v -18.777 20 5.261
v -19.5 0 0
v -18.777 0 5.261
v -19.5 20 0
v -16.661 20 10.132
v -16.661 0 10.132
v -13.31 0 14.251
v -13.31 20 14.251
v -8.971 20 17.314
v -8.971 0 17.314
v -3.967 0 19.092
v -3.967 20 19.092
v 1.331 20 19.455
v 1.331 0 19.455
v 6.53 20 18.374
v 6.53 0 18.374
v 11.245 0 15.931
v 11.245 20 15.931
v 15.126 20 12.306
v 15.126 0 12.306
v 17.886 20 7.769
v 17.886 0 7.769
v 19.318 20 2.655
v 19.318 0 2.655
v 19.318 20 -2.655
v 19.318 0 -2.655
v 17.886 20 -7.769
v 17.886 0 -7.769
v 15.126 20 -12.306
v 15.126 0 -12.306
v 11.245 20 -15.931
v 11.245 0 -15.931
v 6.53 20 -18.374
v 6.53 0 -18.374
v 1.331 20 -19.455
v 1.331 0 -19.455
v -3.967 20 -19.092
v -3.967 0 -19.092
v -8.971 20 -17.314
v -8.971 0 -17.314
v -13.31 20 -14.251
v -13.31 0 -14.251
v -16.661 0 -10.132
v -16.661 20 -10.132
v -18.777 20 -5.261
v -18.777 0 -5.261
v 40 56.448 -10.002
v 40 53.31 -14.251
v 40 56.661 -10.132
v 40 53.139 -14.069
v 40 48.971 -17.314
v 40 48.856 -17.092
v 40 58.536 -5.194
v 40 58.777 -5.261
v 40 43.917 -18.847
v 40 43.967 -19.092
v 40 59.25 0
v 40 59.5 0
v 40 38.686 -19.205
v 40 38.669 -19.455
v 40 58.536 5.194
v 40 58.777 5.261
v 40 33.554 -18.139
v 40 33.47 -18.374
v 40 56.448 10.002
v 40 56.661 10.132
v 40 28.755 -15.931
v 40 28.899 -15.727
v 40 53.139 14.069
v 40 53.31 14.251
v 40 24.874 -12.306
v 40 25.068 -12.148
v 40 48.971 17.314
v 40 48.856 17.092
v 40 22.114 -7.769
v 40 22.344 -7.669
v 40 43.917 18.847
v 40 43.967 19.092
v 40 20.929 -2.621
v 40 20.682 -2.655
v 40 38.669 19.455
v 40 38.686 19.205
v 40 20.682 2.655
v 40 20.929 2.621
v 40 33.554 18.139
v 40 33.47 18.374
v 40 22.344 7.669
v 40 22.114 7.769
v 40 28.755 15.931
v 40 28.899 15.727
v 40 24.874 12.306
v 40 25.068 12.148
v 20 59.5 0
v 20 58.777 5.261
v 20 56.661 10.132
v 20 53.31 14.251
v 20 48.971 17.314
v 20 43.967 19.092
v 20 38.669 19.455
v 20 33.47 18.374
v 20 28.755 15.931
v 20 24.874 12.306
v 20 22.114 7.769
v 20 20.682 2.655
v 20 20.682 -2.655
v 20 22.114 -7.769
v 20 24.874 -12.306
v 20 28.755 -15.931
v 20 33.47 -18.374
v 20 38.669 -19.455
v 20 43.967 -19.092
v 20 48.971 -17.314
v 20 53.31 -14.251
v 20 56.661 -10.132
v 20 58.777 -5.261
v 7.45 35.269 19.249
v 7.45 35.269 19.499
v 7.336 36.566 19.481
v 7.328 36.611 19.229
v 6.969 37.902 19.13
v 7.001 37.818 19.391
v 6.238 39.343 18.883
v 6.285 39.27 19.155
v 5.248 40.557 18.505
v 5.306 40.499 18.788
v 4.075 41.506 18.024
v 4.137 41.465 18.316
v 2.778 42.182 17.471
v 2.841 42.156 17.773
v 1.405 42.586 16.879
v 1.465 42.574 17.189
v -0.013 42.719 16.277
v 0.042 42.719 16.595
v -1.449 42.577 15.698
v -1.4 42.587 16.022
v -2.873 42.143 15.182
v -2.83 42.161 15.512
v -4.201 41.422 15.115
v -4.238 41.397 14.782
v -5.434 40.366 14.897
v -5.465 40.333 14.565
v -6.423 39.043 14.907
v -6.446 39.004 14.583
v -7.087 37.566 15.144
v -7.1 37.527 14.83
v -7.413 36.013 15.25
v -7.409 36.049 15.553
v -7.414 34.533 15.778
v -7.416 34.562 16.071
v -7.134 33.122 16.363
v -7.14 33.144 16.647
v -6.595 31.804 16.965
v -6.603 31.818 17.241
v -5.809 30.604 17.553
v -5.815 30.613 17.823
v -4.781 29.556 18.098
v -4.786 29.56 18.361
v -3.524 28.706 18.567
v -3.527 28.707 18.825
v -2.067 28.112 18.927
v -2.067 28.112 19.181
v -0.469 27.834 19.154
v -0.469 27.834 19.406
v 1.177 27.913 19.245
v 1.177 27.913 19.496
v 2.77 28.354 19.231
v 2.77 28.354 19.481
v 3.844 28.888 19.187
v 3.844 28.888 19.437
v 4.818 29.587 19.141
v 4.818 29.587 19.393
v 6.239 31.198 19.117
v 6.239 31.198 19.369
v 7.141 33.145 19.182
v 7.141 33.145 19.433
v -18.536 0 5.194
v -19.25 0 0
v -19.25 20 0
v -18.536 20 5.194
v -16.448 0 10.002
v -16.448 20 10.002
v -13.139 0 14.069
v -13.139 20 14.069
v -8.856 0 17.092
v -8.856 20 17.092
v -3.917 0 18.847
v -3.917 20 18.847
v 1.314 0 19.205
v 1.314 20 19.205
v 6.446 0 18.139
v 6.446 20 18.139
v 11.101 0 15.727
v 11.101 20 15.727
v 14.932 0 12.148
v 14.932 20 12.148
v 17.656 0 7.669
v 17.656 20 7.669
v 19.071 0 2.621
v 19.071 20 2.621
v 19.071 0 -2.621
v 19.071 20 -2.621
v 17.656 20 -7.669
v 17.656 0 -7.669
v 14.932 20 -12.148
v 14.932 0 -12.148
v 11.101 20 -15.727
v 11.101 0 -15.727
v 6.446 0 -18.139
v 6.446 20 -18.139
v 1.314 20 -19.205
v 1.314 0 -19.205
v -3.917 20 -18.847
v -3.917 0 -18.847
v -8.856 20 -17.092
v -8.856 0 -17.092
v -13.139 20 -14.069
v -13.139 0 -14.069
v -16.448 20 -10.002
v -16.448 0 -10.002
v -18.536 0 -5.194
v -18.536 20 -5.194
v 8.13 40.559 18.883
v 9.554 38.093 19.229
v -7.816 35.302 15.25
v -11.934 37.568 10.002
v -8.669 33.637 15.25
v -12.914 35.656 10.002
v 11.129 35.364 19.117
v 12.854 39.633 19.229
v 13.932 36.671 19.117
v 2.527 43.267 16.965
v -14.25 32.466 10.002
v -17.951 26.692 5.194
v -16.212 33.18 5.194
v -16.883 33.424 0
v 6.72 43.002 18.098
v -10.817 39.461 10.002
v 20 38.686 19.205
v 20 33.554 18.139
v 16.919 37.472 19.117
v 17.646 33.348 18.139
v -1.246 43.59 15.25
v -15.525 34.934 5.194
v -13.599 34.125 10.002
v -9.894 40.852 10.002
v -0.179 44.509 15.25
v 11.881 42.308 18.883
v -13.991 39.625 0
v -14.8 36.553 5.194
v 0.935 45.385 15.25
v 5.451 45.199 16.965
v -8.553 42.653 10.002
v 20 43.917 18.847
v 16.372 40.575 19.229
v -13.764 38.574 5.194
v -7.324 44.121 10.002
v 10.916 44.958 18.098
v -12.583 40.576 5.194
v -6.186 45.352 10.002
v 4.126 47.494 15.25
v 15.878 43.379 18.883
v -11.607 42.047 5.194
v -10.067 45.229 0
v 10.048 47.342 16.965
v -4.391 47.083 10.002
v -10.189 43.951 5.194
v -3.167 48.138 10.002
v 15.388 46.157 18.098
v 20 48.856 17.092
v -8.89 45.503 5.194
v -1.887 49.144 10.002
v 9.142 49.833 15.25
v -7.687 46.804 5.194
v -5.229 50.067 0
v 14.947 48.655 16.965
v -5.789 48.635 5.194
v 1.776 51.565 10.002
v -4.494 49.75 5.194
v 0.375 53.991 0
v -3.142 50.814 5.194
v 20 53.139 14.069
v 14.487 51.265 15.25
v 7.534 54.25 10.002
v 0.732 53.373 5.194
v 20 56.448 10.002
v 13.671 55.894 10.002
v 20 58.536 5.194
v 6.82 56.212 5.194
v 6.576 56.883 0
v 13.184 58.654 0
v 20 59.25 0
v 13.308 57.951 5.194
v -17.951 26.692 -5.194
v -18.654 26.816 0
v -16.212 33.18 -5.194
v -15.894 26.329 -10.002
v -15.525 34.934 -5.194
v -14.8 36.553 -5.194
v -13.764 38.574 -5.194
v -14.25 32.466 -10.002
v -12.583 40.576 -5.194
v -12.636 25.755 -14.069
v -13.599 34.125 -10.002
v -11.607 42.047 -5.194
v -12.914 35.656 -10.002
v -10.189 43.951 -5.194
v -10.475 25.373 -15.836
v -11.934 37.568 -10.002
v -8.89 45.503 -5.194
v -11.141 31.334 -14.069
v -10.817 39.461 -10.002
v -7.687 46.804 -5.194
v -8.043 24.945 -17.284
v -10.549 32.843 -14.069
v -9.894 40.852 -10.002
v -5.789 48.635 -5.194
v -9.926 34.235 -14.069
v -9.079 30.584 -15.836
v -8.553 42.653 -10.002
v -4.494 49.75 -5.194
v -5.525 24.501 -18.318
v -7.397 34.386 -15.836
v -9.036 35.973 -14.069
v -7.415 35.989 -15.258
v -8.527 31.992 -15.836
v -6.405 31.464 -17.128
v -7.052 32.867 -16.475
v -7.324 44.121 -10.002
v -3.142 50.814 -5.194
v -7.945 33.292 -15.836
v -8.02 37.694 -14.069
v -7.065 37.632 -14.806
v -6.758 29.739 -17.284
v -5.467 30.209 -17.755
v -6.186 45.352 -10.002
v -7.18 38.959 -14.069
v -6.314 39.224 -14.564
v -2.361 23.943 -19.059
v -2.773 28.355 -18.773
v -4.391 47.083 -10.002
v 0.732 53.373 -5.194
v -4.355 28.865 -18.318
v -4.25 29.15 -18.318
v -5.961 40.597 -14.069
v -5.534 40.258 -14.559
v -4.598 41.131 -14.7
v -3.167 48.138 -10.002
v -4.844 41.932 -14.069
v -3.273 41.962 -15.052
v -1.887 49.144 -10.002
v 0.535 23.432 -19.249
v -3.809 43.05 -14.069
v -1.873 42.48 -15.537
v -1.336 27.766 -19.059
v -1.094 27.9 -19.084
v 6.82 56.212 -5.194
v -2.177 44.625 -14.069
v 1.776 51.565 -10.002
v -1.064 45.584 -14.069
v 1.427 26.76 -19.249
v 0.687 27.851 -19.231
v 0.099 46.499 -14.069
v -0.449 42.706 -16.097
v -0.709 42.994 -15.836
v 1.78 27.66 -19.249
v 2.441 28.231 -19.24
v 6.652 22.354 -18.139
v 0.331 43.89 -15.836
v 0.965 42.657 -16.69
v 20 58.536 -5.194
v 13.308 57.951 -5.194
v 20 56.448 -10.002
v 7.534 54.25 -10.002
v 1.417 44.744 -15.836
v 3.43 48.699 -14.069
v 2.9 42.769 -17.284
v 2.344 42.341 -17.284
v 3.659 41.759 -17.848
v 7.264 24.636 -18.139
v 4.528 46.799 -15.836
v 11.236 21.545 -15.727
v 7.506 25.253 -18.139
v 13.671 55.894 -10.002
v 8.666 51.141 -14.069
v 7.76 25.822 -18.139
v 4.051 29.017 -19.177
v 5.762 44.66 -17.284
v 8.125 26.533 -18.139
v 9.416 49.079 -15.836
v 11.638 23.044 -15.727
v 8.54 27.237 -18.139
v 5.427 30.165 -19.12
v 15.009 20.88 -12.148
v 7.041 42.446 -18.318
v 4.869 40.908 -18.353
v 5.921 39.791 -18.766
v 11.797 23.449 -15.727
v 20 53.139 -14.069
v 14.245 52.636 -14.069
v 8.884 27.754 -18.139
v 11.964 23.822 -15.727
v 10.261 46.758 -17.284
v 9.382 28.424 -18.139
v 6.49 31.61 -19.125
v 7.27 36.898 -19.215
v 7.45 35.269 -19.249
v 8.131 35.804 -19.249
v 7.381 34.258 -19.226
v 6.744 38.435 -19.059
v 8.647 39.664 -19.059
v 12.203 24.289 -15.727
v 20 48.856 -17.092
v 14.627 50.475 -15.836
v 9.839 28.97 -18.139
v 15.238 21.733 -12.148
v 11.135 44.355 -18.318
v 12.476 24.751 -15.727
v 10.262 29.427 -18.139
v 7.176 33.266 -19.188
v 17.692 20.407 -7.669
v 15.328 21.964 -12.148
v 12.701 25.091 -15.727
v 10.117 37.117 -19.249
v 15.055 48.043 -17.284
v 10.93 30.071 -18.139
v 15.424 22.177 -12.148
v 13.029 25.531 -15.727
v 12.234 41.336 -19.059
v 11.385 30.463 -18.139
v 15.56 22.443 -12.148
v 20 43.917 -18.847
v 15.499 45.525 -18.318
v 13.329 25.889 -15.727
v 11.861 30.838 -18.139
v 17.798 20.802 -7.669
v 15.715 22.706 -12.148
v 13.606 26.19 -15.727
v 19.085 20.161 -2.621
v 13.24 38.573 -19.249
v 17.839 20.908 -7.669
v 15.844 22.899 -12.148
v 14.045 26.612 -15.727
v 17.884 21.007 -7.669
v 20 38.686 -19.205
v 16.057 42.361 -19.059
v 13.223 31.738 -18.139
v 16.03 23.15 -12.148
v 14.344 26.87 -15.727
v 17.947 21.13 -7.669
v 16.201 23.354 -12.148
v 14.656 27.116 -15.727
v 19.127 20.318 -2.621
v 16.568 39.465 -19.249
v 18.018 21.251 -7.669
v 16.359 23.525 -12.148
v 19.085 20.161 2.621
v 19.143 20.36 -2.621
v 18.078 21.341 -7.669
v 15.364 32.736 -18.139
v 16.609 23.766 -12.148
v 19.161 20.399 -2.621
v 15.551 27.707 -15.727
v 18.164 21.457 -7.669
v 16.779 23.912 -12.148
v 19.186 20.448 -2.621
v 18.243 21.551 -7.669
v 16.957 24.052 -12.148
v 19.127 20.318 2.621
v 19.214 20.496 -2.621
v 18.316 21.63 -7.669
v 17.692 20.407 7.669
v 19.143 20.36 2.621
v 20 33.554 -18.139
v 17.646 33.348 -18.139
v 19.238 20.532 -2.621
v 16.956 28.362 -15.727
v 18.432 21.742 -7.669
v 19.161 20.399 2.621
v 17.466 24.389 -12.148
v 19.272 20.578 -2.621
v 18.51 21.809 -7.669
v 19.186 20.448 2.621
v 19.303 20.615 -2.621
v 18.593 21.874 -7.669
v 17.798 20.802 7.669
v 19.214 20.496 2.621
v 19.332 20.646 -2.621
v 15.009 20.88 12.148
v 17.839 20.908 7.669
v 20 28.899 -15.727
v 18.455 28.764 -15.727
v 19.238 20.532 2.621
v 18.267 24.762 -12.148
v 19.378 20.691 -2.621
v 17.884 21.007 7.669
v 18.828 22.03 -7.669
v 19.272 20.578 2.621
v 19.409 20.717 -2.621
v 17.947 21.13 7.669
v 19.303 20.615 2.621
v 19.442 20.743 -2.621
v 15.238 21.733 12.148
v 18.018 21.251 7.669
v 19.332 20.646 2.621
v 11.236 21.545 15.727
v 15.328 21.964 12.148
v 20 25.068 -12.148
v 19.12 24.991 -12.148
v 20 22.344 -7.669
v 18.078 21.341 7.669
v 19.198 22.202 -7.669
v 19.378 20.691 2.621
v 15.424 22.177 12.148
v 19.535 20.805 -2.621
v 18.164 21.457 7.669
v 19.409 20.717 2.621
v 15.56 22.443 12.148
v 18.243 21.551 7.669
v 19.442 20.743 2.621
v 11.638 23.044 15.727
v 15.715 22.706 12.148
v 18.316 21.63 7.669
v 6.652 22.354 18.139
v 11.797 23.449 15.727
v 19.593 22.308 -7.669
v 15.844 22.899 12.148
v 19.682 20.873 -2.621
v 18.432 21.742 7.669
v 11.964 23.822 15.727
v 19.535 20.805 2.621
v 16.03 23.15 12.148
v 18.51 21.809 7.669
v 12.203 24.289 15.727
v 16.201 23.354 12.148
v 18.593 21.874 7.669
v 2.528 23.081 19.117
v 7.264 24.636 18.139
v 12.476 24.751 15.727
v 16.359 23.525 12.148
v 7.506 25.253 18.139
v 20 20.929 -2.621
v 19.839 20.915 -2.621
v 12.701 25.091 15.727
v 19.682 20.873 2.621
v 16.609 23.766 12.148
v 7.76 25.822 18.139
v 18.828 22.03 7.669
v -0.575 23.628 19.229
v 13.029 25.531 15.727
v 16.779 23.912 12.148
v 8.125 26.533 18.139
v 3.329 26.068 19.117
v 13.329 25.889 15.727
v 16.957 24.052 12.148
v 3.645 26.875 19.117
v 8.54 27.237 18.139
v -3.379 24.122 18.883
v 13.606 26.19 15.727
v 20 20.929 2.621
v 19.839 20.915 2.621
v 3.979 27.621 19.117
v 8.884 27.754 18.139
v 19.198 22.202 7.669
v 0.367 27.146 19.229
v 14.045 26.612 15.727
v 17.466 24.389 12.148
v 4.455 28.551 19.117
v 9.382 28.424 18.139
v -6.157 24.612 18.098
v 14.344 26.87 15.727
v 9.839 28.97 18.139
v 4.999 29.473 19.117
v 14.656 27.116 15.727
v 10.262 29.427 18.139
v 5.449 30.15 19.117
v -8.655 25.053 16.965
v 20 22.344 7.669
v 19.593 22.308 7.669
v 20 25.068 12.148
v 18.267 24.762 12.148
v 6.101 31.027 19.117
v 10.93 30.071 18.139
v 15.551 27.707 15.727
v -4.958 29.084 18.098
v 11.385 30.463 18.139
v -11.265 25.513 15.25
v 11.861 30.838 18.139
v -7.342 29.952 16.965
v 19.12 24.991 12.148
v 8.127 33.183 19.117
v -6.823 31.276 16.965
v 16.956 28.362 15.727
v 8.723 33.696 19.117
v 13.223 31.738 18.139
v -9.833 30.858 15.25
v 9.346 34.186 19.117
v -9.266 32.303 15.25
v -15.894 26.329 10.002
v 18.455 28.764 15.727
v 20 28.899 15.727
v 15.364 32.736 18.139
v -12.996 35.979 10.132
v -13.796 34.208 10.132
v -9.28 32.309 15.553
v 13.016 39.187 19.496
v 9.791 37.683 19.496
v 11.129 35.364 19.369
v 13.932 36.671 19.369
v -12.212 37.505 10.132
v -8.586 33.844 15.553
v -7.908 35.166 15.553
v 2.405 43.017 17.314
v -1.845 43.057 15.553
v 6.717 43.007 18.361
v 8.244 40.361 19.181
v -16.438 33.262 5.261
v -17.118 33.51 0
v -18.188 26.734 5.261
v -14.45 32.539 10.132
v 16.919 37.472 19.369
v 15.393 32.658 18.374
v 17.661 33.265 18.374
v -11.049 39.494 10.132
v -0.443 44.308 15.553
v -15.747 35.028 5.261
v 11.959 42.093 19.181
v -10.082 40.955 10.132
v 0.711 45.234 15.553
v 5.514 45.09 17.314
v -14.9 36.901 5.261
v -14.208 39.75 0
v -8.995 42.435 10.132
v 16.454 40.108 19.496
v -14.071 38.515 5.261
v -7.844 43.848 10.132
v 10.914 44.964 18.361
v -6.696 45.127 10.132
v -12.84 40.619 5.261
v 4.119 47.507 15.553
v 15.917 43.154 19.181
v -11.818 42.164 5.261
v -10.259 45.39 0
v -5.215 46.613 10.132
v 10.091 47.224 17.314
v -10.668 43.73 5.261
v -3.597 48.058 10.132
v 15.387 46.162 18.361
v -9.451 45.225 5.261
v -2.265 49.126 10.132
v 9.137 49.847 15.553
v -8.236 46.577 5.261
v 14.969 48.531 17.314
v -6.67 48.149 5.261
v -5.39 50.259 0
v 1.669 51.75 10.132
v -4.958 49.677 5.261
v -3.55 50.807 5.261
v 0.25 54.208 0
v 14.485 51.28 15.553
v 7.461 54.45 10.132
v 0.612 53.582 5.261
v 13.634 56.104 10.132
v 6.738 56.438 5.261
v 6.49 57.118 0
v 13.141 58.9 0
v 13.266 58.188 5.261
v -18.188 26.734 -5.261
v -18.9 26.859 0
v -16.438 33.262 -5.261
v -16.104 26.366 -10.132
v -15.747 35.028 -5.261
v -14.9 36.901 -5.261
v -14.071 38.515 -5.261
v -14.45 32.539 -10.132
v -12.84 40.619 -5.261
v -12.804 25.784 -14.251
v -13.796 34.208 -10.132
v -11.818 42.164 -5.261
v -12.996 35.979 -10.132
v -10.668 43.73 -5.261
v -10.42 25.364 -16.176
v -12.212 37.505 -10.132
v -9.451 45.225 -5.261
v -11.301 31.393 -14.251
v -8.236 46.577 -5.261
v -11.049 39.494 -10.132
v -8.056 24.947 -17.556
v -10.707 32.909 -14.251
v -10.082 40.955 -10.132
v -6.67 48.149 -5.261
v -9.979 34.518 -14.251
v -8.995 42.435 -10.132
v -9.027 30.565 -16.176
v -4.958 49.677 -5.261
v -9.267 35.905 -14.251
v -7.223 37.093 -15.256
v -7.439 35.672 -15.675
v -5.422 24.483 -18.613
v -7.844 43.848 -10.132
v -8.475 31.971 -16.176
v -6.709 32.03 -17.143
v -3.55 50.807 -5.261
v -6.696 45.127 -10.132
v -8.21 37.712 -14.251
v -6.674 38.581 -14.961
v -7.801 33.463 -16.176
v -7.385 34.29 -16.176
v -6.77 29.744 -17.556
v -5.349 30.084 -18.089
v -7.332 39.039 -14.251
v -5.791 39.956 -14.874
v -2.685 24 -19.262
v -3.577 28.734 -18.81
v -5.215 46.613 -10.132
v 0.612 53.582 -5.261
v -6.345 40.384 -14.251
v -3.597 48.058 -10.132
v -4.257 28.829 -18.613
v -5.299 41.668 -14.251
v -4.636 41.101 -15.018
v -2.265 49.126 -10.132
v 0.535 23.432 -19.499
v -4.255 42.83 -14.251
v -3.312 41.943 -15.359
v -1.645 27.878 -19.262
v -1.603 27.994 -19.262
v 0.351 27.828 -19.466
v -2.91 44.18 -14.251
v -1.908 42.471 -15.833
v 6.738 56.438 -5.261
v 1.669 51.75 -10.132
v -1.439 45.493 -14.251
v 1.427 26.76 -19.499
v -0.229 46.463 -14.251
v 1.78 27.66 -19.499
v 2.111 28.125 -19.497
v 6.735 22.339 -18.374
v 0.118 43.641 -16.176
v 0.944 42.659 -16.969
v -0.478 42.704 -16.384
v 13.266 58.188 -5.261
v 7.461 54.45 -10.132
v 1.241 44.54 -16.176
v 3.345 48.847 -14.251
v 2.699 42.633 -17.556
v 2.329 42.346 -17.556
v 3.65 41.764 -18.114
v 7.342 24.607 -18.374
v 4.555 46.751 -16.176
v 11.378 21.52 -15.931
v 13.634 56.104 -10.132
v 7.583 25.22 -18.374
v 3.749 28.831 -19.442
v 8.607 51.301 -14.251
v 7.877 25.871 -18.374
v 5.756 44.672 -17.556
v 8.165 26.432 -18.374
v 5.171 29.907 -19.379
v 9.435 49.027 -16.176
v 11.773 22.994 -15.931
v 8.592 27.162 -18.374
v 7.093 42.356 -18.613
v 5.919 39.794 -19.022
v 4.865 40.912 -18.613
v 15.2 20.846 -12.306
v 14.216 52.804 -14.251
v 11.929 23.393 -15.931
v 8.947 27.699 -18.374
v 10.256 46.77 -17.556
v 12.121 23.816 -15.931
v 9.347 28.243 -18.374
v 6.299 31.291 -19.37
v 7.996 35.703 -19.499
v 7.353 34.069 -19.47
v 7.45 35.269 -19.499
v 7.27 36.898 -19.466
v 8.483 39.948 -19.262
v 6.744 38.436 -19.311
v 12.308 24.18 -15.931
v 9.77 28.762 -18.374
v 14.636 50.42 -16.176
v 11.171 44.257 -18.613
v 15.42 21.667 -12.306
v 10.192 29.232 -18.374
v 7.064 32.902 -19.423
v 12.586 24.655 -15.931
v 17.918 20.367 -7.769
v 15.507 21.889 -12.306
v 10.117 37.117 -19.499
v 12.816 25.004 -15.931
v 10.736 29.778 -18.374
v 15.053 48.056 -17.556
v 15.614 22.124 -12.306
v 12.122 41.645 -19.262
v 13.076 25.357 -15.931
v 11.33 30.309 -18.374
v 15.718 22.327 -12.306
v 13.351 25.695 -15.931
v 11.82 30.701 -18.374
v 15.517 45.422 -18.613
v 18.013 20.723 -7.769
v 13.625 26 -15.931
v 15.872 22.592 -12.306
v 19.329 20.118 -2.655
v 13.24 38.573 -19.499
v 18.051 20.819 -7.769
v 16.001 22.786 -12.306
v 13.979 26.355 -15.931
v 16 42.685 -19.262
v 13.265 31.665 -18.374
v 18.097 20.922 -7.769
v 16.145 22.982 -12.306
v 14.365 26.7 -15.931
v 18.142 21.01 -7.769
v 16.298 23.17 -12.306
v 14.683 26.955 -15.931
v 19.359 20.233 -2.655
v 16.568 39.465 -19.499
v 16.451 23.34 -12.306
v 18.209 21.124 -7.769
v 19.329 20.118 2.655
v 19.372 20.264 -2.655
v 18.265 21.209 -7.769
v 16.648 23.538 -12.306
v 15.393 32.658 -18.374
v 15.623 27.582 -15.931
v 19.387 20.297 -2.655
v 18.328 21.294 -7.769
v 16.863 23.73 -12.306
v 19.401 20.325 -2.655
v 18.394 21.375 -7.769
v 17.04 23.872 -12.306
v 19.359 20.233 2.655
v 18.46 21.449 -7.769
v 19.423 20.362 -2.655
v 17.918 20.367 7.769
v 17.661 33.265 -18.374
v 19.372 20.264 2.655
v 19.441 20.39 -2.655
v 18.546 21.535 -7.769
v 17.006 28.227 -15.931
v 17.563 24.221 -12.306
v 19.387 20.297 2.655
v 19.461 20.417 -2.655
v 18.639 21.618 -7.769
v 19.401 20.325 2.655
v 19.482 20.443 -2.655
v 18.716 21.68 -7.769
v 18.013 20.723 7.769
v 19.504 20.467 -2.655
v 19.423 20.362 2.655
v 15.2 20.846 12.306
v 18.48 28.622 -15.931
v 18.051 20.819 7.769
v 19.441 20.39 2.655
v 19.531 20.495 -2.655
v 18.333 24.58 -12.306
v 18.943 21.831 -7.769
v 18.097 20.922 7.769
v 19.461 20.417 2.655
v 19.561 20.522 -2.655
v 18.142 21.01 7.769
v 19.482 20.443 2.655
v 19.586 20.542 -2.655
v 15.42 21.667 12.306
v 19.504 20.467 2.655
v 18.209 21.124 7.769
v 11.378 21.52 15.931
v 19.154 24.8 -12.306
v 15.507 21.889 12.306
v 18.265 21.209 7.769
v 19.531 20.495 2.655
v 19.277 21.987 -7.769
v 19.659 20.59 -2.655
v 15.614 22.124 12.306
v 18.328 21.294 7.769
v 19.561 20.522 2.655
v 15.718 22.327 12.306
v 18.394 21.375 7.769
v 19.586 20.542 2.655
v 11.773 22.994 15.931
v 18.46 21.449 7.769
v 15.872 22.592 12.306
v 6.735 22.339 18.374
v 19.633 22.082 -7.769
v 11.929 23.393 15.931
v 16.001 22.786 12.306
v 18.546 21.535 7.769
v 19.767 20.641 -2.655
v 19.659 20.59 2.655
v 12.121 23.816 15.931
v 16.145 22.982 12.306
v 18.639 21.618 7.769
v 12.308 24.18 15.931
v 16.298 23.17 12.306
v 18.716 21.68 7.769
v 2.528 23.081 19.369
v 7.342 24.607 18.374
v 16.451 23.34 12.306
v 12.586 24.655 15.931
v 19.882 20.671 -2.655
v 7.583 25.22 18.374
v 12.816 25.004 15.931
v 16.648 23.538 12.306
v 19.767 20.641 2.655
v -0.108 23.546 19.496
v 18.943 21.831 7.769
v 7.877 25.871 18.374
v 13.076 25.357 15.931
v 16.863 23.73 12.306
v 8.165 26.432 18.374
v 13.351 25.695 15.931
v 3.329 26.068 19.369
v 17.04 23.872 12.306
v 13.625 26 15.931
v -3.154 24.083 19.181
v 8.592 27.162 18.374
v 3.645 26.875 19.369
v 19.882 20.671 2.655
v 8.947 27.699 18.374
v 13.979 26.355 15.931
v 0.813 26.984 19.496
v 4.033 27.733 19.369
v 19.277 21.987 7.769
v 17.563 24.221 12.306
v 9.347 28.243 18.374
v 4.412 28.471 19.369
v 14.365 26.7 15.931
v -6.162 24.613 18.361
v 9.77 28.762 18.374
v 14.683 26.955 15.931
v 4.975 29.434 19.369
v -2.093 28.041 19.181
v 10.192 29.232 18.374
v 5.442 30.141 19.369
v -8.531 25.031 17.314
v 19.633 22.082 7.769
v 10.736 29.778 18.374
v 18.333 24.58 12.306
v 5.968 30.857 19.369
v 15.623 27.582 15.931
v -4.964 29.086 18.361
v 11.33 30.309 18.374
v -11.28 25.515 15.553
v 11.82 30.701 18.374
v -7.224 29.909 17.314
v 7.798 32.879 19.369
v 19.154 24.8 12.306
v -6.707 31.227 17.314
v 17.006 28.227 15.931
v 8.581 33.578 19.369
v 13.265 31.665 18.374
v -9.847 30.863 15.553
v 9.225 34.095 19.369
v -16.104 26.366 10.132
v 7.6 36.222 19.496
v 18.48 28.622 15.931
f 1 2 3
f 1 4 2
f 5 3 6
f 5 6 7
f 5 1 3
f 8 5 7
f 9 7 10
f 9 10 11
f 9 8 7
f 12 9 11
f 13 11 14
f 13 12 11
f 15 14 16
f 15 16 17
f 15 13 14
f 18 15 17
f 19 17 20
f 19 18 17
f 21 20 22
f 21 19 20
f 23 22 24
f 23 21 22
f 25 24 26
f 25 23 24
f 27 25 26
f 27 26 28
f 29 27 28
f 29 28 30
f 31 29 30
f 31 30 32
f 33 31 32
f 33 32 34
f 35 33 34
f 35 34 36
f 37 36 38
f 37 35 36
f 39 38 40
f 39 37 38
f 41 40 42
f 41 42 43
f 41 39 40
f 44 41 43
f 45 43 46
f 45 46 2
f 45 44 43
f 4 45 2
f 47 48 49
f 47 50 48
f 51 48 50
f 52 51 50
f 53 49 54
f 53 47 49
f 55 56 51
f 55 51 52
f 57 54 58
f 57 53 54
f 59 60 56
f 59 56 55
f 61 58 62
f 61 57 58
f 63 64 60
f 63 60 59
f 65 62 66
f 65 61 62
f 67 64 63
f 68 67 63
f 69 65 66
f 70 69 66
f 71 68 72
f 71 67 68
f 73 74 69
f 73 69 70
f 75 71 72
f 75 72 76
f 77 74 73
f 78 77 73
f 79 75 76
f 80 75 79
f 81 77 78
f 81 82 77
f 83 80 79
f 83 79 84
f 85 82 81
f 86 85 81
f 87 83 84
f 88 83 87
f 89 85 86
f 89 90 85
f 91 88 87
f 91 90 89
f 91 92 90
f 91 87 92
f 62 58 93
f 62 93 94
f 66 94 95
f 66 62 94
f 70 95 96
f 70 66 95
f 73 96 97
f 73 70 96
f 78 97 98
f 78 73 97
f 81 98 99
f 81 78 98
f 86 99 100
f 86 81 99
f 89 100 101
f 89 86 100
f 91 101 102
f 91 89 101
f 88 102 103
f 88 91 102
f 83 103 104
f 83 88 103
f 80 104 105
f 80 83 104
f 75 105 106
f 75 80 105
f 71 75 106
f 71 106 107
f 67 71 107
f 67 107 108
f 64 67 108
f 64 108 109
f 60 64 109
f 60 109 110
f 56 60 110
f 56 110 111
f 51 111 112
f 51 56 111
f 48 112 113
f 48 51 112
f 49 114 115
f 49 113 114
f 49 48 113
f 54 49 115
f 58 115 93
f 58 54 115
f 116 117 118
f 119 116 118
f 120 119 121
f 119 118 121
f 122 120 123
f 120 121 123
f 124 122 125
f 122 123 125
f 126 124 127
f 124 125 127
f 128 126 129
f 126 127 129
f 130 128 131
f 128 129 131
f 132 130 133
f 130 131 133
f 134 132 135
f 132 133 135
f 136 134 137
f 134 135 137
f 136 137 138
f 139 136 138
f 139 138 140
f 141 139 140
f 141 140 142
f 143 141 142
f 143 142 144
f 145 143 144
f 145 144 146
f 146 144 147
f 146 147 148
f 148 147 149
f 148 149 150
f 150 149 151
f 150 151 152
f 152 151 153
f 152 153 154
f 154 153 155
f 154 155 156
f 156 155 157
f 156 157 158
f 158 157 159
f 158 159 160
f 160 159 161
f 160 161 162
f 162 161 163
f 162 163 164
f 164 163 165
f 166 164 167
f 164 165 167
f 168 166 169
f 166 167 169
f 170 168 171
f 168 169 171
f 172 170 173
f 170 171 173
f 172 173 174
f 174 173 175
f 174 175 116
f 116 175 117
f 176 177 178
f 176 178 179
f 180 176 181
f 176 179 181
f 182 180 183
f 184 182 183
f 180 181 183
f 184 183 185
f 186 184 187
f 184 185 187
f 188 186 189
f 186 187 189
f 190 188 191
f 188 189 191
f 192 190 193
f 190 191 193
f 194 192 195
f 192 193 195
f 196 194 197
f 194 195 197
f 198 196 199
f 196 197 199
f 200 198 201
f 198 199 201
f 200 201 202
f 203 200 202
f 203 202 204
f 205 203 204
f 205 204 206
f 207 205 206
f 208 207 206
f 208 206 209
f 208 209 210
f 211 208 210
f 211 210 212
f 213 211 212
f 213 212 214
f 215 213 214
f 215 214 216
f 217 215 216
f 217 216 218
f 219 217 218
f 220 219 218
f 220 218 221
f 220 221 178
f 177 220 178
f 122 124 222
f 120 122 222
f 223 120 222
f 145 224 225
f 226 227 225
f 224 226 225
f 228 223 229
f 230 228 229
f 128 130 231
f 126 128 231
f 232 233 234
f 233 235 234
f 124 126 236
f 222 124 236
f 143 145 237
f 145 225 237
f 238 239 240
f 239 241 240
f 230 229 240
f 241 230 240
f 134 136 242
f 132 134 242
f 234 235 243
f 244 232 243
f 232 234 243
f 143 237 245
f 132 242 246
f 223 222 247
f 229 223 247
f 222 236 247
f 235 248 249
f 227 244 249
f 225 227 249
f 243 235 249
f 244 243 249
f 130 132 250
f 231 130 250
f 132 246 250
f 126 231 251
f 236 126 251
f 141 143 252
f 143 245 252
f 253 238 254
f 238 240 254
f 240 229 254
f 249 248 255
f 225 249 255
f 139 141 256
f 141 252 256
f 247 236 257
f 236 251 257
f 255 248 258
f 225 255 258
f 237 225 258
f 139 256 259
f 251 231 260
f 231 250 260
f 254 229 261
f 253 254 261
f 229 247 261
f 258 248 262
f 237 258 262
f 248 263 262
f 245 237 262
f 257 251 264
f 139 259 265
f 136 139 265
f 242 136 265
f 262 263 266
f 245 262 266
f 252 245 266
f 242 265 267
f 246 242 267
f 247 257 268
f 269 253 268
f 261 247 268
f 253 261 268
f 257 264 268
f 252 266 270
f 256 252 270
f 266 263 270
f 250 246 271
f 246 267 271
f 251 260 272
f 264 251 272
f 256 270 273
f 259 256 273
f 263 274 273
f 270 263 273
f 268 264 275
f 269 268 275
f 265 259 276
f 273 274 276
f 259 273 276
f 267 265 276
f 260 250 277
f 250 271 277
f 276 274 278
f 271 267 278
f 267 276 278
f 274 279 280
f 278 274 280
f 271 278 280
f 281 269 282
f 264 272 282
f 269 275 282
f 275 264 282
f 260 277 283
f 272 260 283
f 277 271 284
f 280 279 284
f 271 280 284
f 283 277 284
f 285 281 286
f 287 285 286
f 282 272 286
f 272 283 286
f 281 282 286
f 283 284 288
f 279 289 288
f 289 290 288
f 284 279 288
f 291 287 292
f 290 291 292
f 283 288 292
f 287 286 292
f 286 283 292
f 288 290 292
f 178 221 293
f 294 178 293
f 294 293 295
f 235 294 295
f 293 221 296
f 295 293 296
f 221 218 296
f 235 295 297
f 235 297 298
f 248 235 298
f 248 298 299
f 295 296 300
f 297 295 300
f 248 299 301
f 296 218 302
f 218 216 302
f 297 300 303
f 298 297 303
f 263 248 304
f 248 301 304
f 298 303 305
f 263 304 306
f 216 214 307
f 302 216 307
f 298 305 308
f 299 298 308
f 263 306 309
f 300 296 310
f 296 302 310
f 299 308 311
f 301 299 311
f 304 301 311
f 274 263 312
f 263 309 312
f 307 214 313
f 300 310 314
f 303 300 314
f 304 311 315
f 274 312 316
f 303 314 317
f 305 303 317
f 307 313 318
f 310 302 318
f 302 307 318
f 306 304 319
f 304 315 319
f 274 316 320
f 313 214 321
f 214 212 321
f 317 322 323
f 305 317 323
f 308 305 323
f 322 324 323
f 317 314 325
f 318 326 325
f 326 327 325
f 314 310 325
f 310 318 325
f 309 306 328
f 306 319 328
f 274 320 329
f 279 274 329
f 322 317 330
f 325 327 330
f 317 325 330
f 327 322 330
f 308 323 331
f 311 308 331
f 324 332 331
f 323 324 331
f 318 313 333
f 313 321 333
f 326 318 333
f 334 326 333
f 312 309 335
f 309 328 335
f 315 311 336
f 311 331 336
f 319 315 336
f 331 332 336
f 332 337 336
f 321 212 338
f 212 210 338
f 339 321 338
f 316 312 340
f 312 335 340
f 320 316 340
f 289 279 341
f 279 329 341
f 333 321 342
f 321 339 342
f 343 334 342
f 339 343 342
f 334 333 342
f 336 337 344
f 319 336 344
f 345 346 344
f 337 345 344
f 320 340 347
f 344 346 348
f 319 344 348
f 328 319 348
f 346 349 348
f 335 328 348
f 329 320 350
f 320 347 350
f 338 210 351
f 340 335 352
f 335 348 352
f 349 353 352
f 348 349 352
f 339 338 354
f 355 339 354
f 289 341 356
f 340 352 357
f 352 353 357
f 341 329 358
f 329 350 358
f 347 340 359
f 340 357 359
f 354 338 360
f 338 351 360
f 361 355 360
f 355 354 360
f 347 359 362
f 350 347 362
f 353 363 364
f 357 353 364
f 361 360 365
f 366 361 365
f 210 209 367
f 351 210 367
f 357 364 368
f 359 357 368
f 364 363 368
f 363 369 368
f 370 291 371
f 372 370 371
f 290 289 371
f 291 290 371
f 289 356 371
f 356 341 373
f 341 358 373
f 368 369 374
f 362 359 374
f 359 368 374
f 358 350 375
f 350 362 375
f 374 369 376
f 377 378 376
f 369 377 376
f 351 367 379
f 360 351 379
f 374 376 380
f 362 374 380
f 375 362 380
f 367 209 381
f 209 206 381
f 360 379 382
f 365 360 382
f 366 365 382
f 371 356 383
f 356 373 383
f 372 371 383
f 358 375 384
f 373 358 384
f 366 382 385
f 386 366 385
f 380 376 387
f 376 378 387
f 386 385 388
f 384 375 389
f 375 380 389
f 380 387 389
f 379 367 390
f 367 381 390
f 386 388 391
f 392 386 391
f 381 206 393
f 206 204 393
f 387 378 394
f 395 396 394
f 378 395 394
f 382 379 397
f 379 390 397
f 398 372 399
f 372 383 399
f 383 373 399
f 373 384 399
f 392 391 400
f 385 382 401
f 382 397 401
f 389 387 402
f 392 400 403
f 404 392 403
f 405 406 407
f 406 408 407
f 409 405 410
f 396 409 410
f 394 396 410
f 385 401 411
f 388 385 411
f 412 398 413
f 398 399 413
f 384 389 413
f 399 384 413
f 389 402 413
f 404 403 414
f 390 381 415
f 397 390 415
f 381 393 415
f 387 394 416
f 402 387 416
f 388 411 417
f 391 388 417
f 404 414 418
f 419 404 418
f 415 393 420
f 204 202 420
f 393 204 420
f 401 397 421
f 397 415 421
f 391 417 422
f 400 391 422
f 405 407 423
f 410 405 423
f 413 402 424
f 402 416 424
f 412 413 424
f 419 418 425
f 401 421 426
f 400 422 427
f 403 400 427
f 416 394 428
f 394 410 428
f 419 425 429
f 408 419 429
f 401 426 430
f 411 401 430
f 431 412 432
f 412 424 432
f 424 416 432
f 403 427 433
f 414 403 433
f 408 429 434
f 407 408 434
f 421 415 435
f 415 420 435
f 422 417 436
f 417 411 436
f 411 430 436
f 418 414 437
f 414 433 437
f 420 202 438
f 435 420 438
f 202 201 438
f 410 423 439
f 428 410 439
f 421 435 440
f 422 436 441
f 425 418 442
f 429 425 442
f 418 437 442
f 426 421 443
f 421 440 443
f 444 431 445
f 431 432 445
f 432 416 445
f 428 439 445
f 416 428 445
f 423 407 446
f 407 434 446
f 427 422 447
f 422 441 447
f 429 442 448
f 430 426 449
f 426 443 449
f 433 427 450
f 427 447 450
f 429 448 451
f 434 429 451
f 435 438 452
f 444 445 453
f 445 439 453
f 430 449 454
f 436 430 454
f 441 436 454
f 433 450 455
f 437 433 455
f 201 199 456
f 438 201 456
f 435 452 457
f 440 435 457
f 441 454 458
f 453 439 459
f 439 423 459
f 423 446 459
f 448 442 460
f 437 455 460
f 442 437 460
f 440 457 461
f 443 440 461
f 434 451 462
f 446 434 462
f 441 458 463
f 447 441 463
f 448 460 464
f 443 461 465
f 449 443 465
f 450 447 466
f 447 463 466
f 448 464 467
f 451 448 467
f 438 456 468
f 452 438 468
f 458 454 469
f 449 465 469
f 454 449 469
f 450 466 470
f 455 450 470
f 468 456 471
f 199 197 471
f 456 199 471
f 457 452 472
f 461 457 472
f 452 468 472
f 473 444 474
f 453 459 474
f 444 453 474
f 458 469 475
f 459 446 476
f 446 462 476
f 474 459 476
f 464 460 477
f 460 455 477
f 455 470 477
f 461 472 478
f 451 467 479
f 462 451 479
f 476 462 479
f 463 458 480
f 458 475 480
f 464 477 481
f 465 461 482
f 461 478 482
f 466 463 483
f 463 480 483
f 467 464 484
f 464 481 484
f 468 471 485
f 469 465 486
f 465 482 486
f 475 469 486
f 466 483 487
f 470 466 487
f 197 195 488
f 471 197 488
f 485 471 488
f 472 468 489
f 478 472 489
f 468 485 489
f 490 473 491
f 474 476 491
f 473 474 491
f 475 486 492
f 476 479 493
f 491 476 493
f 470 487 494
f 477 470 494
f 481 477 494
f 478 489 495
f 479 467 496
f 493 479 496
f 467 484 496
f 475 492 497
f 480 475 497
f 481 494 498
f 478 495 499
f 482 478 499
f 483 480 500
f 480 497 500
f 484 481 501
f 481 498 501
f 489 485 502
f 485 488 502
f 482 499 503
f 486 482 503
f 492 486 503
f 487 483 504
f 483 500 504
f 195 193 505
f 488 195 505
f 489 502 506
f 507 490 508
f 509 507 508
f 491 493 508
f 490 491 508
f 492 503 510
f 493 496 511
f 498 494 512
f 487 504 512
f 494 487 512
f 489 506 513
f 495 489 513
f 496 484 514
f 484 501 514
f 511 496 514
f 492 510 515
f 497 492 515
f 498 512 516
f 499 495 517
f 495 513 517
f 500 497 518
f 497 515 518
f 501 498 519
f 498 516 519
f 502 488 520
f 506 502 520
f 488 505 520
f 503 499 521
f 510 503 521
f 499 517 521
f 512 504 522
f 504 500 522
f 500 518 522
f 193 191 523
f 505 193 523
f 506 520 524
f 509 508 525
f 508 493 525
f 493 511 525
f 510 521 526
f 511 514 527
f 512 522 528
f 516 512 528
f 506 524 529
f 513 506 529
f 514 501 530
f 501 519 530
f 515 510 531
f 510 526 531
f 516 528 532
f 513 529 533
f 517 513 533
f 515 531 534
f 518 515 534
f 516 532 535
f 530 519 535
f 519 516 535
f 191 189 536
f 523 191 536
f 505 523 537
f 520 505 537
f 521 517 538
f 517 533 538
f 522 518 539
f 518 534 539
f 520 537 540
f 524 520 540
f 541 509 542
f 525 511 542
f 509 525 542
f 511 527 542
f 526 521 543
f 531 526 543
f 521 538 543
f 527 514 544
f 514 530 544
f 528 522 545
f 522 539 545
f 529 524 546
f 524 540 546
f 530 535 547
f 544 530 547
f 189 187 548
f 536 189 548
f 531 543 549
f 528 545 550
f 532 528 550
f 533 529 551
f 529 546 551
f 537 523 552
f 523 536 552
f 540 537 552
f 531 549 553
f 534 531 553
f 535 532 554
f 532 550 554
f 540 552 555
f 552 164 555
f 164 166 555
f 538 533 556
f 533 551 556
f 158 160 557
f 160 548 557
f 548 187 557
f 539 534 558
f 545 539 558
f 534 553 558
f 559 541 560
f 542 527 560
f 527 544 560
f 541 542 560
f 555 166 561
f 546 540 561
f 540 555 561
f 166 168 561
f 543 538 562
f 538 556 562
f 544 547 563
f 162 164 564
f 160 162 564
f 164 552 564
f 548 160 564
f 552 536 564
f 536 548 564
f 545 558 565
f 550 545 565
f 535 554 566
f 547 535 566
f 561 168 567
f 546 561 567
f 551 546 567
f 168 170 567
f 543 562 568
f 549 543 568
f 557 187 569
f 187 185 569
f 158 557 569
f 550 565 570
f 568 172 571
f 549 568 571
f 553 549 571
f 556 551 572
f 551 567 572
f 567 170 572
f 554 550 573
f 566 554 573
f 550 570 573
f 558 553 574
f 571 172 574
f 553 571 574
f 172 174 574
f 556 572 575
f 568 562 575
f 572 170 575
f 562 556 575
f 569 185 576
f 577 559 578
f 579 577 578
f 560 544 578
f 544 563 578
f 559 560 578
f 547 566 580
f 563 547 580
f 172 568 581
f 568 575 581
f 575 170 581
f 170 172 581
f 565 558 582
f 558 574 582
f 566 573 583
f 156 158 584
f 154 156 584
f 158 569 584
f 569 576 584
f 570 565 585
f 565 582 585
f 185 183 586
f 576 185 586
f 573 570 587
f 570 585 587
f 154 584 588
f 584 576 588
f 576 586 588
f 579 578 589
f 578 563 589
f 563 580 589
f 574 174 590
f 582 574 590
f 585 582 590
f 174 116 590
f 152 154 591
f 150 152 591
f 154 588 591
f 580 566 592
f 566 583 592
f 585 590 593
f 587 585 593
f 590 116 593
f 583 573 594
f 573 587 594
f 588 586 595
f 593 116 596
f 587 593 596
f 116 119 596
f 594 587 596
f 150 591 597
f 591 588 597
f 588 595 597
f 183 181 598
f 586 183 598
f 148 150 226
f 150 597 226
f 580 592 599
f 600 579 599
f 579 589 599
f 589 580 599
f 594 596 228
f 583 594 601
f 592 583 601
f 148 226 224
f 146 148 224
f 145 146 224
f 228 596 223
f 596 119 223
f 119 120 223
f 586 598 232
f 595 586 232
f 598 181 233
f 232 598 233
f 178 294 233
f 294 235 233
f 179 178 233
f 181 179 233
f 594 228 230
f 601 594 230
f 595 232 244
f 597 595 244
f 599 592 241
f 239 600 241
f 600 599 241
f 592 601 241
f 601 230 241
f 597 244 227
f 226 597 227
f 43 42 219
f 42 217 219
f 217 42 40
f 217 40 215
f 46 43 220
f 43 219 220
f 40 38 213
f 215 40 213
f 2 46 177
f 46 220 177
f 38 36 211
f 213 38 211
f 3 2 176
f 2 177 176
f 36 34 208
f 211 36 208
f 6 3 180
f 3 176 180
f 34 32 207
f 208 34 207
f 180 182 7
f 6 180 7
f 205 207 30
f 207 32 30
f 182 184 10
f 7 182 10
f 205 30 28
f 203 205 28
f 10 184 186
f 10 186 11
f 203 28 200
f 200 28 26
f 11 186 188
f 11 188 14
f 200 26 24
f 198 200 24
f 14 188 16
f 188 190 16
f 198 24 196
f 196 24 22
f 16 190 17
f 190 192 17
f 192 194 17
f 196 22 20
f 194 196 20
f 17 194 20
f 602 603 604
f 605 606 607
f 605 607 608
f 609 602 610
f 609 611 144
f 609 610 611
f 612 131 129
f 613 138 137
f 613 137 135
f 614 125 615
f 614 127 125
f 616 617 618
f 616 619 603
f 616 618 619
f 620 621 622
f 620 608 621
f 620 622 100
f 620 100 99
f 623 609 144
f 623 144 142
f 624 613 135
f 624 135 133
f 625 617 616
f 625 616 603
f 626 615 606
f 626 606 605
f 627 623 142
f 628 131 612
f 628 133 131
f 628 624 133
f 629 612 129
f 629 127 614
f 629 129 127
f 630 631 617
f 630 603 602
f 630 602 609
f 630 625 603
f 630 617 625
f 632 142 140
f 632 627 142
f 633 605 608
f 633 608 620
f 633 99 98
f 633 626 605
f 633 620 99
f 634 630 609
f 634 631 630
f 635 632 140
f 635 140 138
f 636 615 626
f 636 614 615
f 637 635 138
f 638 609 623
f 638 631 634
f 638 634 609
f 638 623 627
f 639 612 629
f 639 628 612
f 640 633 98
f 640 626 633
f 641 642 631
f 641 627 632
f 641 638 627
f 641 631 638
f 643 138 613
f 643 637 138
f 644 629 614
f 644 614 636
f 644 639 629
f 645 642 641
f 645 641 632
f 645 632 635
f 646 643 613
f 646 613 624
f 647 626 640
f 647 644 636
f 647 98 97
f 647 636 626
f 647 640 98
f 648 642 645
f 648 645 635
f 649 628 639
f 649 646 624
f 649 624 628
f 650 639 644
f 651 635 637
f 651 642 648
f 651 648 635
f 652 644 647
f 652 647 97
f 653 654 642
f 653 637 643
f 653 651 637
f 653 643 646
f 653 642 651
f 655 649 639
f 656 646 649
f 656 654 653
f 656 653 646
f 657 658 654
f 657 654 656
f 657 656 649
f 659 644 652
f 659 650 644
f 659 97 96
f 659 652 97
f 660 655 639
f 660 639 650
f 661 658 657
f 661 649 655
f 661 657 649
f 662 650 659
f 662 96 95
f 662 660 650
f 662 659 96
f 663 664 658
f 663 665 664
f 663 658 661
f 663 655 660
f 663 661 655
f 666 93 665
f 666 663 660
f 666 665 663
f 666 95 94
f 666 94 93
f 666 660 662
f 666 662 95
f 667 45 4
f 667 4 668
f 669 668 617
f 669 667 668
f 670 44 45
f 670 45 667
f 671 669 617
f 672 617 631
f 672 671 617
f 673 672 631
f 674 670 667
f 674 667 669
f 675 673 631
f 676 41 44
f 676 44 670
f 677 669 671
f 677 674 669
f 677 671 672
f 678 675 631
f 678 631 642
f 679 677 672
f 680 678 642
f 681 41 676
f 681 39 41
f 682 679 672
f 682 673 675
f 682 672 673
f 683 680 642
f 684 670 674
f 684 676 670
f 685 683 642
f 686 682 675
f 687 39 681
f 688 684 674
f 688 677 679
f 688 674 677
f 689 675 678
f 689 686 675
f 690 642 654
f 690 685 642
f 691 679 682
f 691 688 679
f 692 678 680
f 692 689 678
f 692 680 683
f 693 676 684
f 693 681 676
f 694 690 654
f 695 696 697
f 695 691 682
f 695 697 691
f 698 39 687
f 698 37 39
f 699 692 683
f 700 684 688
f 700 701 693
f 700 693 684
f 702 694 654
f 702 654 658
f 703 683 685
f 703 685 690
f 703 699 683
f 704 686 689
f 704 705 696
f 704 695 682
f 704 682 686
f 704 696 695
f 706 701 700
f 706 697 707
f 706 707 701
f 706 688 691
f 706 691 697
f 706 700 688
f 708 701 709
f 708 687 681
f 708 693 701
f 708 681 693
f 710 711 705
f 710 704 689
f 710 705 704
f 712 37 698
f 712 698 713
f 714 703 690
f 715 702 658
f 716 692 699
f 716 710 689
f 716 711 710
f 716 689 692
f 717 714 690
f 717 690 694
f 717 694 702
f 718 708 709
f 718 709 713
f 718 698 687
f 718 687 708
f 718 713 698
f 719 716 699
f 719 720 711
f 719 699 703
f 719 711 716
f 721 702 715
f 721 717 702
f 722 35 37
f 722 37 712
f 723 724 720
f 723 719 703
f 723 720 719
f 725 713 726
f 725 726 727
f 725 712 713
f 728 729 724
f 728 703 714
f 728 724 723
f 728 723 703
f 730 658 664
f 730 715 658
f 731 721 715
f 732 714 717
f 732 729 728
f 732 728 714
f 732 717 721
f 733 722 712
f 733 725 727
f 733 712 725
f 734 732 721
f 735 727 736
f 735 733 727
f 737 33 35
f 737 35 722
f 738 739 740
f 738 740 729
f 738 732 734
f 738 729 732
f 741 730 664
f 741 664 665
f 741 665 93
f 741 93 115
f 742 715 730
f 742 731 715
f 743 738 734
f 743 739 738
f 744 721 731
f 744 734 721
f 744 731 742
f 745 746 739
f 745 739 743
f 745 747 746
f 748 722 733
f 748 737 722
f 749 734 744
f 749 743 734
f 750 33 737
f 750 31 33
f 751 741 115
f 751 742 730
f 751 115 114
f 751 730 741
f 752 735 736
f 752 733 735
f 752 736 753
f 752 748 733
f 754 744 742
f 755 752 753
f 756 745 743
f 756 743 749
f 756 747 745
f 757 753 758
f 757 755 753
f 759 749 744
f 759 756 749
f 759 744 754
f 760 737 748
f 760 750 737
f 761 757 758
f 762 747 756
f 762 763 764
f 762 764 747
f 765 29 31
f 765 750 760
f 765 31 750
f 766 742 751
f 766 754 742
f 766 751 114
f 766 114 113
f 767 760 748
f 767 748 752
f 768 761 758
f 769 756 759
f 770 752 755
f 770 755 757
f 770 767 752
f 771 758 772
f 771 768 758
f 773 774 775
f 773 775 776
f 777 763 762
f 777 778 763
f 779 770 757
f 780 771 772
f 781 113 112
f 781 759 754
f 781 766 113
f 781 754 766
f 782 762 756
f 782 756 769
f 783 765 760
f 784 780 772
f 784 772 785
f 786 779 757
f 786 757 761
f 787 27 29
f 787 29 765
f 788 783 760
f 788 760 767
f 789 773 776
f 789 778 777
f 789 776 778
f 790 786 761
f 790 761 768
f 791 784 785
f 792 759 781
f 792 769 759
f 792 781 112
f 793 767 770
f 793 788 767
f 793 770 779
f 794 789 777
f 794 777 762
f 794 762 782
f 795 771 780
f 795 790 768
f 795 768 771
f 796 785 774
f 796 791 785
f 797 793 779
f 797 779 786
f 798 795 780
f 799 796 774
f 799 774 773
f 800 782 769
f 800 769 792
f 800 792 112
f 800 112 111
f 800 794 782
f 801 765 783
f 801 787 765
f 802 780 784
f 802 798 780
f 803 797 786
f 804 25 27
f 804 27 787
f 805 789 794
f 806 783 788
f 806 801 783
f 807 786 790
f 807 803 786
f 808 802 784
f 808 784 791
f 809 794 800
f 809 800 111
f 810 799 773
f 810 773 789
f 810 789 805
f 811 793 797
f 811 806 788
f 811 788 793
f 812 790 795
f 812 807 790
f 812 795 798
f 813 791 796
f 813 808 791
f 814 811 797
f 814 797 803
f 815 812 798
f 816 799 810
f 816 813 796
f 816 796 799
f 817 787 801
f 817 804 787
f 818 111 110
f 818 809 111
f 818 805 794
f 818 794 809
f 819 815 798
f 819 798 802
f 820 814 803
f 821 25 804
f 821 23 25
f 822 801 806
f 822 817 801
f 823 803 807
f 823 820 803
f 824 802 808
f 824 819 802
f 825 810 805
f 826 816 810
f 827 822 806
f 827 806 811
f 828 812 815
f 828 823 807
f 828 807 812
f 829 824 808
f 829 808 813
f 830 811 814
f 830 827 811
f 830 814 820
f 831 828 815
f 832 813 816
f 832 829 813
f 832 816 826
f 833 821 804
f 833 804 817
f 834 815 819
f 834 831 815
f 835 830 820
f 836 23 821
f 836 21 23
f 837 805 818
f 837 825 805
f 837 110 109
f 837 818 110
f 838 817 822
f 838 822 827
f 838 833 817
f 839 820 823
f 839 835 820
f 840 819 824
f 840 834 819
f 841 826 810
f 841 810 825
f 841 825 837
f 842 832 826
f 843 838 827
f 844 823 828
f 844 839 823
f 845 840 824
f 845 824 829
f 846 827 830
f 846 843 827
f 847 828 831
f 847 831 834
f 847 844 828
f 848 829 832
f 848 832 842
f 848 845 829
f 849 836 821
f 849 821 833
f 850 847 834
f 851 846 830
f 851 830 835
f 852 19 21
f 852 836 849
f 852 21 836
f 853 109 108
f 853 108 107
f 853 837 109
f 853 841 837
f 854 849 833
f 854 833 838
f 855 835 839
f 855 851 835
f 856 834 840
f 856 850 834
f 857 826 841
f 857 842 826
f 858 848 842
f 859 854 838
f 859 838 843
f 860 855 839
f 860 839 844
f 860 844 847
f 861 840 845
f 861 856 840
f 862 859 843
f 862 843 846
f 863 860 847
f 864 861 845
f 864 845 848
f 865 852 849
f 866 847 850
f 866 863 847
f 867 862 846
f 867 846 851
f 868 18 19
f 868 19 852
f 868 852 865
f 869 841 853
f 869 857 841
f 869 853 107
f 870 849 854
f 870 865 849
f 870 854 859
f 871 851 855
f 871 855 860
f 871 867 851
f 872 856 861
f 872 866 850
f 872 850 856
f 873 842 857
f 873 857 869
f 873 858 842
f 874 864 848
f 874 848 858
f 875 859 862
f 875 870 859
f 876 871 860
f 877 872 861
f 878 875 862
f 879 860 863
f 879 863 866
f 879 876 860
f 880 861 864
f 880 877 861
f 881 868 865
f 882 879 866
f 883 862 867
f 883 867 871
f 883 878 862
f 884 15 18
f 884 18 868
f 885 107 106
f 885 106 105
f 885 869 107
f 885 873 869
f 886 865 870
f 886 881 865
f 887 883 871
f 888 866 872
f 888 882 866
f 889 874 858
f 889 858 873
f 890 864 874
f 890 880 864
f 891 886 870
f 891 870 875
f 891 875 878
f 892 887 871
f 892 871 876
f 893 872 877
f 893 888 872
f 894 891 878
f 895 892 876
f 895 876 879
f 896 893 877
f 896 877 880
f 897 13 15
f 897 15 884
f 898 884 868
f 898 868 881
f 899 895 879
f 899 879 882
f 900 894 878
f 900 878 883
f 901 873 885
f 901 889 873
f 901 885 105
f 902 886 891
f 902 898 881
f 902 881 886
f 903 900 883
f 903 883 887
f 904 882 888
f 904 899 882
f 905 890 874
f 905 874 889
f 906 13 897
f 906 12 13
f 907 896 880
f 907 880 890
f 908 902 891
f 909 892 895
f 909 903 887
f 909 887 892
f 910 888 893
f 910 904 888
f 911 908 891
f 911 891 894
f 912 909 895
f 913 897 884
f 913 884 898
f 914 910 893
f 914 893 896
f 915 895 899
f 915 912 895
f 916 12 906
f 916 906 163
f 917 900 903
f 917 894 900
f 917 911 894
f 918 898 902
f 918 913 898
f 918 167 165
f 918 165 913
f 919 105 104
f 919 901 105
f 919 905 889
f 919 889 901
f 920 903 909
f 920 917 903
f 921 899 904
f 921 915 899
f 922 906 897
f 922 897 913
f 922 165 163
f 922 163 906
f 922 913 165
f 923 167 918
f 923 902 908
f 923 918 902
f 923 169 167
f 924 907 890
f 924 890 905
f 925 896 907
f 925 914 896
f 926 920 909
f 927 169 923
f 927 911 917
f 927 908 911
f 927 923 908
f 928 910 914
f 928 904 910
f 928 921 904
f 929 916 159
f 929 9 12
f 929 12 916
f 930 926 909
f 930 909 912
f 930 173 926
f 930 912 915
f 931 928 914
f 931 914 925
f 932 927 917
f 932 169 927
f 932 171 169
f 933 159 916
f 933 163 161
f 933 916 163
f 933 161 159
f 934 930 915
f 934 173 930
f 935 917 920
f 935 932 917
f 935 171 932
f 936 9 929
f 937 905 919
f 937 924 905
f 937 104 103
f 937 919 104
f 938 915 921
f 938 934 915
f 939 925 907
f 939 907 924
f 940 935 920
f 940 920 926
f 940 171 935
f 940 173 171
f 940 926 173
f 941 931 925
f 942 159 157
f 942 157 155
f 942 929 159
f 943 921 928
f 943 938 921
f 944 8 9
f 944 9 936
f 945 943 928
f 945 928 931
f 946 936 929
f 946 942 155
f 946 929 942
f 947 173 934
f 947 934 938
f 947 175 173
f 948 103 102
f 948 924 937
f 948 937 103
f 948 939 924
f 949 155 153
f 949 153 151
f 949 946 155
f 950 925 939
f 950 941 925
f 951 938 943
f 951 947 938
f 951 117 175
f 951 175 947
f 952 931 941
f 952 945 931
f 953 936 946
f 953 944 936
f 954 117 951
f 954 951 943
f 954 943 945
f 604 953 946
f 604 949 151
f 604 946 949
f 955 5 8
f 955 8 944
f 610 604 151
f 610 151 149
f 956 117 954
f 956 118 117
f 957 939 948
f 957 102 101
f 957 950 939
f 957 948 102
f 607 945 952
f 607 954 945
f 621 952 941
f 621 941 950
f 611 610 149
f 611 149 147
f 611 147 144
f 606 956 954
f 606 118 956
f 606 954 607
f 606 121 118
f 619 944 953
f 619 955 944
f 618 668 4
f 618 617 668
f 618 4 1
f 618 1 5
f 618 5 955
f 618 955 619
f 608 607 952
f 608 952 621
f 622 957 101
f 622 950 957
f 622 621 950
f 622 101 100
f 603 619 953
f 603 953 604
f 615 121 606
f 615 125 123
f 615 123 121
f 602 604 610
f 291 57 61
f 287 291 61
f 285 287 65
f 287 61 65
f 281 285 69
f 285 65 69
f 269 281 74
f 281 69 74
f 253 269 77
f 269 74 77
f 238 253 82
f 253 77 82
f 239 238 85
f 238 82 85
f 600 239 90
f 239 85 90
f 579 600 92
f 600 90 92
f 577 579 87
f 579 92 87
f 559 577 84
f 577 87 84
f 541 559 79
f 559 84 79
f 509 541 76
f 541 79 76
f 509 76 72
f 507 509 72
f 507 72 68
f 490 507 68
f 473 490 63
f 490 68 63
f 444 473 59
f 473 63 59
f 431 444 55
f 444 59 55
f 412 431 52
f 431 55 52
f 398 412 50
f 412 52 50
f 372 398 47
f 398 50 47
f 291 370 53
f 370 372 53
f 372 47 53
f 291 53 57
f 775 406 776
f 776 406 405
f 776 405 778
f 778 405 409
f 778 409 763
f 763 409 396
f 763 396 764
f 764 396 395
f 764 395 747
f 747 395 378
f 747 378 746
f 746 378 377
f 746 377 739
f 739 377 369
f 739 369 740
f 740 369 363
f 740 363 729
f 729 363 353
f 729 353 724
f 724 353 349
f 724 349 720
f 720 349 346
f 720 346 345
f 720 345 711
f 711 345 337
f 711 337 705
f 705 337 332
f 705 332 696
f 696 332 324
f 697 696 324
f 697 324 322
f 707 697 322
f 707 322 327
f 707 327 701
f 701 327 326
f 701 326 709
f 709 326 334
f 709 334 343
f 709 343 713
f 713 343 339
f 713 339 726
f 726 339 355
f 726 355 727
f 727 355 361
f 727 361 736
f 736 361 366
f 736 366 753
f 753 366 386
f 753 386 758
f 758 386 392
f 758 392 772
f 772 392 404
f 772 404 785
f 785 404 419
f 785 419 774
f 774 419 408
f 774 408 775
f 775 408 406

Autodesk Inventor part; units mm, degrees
ref_plane "YZ Plane" through (0, 0, 0) normal (1, 0, 0) x (0, 1, 0)
ref_plane "XZ Plane" through (0, 0, 0) normal (0, 1, 0) x (-1, 0, 0)
ref_plane "XY Plane" through (0, 0, 0) normal (0, 0, 1) x (1, 0, 0)
sketch "Sketch1" plane through (0, 0, 0) normal (0, 0, 1) x (1, 0, 0)
  line L0 (0, 0) -> (0, 20)
  line L1 (20, 40) -> (40, 40)
  arc A0 (20, 40) -> (0, 20) centre (20, 20) ccw
  point P0 (0, 40)
  dimension "d0" = 40
  dimension "d1" = 40
  dimension "d2" = 20
sketch "Sketch2" plane through (0, 0, 0) normal (0, 1, 0) x (-1, 0, 0)
  circle A0 centre (0, 0) radius 19.5
  circle A1 centre (0, 0) radius 19.25
  dimension "d3" = 39
  dimension "d4" = 38.5
sweep "Sweep1" add profiles "Sketch2" path "Sketch1"
sketch "Sketch4" plane through (0, 0, 0) normal (0, 0, 1) x (1, 0, 0)
  circle A0 centre (0, 35.2694) radius 7.45
  point P0 (0, 0)
  dimension "d10" = 14.9
extrude "Extrusion2" cut sketch "Sketch4" against normal mid plane 40
properties part number "elbow"
